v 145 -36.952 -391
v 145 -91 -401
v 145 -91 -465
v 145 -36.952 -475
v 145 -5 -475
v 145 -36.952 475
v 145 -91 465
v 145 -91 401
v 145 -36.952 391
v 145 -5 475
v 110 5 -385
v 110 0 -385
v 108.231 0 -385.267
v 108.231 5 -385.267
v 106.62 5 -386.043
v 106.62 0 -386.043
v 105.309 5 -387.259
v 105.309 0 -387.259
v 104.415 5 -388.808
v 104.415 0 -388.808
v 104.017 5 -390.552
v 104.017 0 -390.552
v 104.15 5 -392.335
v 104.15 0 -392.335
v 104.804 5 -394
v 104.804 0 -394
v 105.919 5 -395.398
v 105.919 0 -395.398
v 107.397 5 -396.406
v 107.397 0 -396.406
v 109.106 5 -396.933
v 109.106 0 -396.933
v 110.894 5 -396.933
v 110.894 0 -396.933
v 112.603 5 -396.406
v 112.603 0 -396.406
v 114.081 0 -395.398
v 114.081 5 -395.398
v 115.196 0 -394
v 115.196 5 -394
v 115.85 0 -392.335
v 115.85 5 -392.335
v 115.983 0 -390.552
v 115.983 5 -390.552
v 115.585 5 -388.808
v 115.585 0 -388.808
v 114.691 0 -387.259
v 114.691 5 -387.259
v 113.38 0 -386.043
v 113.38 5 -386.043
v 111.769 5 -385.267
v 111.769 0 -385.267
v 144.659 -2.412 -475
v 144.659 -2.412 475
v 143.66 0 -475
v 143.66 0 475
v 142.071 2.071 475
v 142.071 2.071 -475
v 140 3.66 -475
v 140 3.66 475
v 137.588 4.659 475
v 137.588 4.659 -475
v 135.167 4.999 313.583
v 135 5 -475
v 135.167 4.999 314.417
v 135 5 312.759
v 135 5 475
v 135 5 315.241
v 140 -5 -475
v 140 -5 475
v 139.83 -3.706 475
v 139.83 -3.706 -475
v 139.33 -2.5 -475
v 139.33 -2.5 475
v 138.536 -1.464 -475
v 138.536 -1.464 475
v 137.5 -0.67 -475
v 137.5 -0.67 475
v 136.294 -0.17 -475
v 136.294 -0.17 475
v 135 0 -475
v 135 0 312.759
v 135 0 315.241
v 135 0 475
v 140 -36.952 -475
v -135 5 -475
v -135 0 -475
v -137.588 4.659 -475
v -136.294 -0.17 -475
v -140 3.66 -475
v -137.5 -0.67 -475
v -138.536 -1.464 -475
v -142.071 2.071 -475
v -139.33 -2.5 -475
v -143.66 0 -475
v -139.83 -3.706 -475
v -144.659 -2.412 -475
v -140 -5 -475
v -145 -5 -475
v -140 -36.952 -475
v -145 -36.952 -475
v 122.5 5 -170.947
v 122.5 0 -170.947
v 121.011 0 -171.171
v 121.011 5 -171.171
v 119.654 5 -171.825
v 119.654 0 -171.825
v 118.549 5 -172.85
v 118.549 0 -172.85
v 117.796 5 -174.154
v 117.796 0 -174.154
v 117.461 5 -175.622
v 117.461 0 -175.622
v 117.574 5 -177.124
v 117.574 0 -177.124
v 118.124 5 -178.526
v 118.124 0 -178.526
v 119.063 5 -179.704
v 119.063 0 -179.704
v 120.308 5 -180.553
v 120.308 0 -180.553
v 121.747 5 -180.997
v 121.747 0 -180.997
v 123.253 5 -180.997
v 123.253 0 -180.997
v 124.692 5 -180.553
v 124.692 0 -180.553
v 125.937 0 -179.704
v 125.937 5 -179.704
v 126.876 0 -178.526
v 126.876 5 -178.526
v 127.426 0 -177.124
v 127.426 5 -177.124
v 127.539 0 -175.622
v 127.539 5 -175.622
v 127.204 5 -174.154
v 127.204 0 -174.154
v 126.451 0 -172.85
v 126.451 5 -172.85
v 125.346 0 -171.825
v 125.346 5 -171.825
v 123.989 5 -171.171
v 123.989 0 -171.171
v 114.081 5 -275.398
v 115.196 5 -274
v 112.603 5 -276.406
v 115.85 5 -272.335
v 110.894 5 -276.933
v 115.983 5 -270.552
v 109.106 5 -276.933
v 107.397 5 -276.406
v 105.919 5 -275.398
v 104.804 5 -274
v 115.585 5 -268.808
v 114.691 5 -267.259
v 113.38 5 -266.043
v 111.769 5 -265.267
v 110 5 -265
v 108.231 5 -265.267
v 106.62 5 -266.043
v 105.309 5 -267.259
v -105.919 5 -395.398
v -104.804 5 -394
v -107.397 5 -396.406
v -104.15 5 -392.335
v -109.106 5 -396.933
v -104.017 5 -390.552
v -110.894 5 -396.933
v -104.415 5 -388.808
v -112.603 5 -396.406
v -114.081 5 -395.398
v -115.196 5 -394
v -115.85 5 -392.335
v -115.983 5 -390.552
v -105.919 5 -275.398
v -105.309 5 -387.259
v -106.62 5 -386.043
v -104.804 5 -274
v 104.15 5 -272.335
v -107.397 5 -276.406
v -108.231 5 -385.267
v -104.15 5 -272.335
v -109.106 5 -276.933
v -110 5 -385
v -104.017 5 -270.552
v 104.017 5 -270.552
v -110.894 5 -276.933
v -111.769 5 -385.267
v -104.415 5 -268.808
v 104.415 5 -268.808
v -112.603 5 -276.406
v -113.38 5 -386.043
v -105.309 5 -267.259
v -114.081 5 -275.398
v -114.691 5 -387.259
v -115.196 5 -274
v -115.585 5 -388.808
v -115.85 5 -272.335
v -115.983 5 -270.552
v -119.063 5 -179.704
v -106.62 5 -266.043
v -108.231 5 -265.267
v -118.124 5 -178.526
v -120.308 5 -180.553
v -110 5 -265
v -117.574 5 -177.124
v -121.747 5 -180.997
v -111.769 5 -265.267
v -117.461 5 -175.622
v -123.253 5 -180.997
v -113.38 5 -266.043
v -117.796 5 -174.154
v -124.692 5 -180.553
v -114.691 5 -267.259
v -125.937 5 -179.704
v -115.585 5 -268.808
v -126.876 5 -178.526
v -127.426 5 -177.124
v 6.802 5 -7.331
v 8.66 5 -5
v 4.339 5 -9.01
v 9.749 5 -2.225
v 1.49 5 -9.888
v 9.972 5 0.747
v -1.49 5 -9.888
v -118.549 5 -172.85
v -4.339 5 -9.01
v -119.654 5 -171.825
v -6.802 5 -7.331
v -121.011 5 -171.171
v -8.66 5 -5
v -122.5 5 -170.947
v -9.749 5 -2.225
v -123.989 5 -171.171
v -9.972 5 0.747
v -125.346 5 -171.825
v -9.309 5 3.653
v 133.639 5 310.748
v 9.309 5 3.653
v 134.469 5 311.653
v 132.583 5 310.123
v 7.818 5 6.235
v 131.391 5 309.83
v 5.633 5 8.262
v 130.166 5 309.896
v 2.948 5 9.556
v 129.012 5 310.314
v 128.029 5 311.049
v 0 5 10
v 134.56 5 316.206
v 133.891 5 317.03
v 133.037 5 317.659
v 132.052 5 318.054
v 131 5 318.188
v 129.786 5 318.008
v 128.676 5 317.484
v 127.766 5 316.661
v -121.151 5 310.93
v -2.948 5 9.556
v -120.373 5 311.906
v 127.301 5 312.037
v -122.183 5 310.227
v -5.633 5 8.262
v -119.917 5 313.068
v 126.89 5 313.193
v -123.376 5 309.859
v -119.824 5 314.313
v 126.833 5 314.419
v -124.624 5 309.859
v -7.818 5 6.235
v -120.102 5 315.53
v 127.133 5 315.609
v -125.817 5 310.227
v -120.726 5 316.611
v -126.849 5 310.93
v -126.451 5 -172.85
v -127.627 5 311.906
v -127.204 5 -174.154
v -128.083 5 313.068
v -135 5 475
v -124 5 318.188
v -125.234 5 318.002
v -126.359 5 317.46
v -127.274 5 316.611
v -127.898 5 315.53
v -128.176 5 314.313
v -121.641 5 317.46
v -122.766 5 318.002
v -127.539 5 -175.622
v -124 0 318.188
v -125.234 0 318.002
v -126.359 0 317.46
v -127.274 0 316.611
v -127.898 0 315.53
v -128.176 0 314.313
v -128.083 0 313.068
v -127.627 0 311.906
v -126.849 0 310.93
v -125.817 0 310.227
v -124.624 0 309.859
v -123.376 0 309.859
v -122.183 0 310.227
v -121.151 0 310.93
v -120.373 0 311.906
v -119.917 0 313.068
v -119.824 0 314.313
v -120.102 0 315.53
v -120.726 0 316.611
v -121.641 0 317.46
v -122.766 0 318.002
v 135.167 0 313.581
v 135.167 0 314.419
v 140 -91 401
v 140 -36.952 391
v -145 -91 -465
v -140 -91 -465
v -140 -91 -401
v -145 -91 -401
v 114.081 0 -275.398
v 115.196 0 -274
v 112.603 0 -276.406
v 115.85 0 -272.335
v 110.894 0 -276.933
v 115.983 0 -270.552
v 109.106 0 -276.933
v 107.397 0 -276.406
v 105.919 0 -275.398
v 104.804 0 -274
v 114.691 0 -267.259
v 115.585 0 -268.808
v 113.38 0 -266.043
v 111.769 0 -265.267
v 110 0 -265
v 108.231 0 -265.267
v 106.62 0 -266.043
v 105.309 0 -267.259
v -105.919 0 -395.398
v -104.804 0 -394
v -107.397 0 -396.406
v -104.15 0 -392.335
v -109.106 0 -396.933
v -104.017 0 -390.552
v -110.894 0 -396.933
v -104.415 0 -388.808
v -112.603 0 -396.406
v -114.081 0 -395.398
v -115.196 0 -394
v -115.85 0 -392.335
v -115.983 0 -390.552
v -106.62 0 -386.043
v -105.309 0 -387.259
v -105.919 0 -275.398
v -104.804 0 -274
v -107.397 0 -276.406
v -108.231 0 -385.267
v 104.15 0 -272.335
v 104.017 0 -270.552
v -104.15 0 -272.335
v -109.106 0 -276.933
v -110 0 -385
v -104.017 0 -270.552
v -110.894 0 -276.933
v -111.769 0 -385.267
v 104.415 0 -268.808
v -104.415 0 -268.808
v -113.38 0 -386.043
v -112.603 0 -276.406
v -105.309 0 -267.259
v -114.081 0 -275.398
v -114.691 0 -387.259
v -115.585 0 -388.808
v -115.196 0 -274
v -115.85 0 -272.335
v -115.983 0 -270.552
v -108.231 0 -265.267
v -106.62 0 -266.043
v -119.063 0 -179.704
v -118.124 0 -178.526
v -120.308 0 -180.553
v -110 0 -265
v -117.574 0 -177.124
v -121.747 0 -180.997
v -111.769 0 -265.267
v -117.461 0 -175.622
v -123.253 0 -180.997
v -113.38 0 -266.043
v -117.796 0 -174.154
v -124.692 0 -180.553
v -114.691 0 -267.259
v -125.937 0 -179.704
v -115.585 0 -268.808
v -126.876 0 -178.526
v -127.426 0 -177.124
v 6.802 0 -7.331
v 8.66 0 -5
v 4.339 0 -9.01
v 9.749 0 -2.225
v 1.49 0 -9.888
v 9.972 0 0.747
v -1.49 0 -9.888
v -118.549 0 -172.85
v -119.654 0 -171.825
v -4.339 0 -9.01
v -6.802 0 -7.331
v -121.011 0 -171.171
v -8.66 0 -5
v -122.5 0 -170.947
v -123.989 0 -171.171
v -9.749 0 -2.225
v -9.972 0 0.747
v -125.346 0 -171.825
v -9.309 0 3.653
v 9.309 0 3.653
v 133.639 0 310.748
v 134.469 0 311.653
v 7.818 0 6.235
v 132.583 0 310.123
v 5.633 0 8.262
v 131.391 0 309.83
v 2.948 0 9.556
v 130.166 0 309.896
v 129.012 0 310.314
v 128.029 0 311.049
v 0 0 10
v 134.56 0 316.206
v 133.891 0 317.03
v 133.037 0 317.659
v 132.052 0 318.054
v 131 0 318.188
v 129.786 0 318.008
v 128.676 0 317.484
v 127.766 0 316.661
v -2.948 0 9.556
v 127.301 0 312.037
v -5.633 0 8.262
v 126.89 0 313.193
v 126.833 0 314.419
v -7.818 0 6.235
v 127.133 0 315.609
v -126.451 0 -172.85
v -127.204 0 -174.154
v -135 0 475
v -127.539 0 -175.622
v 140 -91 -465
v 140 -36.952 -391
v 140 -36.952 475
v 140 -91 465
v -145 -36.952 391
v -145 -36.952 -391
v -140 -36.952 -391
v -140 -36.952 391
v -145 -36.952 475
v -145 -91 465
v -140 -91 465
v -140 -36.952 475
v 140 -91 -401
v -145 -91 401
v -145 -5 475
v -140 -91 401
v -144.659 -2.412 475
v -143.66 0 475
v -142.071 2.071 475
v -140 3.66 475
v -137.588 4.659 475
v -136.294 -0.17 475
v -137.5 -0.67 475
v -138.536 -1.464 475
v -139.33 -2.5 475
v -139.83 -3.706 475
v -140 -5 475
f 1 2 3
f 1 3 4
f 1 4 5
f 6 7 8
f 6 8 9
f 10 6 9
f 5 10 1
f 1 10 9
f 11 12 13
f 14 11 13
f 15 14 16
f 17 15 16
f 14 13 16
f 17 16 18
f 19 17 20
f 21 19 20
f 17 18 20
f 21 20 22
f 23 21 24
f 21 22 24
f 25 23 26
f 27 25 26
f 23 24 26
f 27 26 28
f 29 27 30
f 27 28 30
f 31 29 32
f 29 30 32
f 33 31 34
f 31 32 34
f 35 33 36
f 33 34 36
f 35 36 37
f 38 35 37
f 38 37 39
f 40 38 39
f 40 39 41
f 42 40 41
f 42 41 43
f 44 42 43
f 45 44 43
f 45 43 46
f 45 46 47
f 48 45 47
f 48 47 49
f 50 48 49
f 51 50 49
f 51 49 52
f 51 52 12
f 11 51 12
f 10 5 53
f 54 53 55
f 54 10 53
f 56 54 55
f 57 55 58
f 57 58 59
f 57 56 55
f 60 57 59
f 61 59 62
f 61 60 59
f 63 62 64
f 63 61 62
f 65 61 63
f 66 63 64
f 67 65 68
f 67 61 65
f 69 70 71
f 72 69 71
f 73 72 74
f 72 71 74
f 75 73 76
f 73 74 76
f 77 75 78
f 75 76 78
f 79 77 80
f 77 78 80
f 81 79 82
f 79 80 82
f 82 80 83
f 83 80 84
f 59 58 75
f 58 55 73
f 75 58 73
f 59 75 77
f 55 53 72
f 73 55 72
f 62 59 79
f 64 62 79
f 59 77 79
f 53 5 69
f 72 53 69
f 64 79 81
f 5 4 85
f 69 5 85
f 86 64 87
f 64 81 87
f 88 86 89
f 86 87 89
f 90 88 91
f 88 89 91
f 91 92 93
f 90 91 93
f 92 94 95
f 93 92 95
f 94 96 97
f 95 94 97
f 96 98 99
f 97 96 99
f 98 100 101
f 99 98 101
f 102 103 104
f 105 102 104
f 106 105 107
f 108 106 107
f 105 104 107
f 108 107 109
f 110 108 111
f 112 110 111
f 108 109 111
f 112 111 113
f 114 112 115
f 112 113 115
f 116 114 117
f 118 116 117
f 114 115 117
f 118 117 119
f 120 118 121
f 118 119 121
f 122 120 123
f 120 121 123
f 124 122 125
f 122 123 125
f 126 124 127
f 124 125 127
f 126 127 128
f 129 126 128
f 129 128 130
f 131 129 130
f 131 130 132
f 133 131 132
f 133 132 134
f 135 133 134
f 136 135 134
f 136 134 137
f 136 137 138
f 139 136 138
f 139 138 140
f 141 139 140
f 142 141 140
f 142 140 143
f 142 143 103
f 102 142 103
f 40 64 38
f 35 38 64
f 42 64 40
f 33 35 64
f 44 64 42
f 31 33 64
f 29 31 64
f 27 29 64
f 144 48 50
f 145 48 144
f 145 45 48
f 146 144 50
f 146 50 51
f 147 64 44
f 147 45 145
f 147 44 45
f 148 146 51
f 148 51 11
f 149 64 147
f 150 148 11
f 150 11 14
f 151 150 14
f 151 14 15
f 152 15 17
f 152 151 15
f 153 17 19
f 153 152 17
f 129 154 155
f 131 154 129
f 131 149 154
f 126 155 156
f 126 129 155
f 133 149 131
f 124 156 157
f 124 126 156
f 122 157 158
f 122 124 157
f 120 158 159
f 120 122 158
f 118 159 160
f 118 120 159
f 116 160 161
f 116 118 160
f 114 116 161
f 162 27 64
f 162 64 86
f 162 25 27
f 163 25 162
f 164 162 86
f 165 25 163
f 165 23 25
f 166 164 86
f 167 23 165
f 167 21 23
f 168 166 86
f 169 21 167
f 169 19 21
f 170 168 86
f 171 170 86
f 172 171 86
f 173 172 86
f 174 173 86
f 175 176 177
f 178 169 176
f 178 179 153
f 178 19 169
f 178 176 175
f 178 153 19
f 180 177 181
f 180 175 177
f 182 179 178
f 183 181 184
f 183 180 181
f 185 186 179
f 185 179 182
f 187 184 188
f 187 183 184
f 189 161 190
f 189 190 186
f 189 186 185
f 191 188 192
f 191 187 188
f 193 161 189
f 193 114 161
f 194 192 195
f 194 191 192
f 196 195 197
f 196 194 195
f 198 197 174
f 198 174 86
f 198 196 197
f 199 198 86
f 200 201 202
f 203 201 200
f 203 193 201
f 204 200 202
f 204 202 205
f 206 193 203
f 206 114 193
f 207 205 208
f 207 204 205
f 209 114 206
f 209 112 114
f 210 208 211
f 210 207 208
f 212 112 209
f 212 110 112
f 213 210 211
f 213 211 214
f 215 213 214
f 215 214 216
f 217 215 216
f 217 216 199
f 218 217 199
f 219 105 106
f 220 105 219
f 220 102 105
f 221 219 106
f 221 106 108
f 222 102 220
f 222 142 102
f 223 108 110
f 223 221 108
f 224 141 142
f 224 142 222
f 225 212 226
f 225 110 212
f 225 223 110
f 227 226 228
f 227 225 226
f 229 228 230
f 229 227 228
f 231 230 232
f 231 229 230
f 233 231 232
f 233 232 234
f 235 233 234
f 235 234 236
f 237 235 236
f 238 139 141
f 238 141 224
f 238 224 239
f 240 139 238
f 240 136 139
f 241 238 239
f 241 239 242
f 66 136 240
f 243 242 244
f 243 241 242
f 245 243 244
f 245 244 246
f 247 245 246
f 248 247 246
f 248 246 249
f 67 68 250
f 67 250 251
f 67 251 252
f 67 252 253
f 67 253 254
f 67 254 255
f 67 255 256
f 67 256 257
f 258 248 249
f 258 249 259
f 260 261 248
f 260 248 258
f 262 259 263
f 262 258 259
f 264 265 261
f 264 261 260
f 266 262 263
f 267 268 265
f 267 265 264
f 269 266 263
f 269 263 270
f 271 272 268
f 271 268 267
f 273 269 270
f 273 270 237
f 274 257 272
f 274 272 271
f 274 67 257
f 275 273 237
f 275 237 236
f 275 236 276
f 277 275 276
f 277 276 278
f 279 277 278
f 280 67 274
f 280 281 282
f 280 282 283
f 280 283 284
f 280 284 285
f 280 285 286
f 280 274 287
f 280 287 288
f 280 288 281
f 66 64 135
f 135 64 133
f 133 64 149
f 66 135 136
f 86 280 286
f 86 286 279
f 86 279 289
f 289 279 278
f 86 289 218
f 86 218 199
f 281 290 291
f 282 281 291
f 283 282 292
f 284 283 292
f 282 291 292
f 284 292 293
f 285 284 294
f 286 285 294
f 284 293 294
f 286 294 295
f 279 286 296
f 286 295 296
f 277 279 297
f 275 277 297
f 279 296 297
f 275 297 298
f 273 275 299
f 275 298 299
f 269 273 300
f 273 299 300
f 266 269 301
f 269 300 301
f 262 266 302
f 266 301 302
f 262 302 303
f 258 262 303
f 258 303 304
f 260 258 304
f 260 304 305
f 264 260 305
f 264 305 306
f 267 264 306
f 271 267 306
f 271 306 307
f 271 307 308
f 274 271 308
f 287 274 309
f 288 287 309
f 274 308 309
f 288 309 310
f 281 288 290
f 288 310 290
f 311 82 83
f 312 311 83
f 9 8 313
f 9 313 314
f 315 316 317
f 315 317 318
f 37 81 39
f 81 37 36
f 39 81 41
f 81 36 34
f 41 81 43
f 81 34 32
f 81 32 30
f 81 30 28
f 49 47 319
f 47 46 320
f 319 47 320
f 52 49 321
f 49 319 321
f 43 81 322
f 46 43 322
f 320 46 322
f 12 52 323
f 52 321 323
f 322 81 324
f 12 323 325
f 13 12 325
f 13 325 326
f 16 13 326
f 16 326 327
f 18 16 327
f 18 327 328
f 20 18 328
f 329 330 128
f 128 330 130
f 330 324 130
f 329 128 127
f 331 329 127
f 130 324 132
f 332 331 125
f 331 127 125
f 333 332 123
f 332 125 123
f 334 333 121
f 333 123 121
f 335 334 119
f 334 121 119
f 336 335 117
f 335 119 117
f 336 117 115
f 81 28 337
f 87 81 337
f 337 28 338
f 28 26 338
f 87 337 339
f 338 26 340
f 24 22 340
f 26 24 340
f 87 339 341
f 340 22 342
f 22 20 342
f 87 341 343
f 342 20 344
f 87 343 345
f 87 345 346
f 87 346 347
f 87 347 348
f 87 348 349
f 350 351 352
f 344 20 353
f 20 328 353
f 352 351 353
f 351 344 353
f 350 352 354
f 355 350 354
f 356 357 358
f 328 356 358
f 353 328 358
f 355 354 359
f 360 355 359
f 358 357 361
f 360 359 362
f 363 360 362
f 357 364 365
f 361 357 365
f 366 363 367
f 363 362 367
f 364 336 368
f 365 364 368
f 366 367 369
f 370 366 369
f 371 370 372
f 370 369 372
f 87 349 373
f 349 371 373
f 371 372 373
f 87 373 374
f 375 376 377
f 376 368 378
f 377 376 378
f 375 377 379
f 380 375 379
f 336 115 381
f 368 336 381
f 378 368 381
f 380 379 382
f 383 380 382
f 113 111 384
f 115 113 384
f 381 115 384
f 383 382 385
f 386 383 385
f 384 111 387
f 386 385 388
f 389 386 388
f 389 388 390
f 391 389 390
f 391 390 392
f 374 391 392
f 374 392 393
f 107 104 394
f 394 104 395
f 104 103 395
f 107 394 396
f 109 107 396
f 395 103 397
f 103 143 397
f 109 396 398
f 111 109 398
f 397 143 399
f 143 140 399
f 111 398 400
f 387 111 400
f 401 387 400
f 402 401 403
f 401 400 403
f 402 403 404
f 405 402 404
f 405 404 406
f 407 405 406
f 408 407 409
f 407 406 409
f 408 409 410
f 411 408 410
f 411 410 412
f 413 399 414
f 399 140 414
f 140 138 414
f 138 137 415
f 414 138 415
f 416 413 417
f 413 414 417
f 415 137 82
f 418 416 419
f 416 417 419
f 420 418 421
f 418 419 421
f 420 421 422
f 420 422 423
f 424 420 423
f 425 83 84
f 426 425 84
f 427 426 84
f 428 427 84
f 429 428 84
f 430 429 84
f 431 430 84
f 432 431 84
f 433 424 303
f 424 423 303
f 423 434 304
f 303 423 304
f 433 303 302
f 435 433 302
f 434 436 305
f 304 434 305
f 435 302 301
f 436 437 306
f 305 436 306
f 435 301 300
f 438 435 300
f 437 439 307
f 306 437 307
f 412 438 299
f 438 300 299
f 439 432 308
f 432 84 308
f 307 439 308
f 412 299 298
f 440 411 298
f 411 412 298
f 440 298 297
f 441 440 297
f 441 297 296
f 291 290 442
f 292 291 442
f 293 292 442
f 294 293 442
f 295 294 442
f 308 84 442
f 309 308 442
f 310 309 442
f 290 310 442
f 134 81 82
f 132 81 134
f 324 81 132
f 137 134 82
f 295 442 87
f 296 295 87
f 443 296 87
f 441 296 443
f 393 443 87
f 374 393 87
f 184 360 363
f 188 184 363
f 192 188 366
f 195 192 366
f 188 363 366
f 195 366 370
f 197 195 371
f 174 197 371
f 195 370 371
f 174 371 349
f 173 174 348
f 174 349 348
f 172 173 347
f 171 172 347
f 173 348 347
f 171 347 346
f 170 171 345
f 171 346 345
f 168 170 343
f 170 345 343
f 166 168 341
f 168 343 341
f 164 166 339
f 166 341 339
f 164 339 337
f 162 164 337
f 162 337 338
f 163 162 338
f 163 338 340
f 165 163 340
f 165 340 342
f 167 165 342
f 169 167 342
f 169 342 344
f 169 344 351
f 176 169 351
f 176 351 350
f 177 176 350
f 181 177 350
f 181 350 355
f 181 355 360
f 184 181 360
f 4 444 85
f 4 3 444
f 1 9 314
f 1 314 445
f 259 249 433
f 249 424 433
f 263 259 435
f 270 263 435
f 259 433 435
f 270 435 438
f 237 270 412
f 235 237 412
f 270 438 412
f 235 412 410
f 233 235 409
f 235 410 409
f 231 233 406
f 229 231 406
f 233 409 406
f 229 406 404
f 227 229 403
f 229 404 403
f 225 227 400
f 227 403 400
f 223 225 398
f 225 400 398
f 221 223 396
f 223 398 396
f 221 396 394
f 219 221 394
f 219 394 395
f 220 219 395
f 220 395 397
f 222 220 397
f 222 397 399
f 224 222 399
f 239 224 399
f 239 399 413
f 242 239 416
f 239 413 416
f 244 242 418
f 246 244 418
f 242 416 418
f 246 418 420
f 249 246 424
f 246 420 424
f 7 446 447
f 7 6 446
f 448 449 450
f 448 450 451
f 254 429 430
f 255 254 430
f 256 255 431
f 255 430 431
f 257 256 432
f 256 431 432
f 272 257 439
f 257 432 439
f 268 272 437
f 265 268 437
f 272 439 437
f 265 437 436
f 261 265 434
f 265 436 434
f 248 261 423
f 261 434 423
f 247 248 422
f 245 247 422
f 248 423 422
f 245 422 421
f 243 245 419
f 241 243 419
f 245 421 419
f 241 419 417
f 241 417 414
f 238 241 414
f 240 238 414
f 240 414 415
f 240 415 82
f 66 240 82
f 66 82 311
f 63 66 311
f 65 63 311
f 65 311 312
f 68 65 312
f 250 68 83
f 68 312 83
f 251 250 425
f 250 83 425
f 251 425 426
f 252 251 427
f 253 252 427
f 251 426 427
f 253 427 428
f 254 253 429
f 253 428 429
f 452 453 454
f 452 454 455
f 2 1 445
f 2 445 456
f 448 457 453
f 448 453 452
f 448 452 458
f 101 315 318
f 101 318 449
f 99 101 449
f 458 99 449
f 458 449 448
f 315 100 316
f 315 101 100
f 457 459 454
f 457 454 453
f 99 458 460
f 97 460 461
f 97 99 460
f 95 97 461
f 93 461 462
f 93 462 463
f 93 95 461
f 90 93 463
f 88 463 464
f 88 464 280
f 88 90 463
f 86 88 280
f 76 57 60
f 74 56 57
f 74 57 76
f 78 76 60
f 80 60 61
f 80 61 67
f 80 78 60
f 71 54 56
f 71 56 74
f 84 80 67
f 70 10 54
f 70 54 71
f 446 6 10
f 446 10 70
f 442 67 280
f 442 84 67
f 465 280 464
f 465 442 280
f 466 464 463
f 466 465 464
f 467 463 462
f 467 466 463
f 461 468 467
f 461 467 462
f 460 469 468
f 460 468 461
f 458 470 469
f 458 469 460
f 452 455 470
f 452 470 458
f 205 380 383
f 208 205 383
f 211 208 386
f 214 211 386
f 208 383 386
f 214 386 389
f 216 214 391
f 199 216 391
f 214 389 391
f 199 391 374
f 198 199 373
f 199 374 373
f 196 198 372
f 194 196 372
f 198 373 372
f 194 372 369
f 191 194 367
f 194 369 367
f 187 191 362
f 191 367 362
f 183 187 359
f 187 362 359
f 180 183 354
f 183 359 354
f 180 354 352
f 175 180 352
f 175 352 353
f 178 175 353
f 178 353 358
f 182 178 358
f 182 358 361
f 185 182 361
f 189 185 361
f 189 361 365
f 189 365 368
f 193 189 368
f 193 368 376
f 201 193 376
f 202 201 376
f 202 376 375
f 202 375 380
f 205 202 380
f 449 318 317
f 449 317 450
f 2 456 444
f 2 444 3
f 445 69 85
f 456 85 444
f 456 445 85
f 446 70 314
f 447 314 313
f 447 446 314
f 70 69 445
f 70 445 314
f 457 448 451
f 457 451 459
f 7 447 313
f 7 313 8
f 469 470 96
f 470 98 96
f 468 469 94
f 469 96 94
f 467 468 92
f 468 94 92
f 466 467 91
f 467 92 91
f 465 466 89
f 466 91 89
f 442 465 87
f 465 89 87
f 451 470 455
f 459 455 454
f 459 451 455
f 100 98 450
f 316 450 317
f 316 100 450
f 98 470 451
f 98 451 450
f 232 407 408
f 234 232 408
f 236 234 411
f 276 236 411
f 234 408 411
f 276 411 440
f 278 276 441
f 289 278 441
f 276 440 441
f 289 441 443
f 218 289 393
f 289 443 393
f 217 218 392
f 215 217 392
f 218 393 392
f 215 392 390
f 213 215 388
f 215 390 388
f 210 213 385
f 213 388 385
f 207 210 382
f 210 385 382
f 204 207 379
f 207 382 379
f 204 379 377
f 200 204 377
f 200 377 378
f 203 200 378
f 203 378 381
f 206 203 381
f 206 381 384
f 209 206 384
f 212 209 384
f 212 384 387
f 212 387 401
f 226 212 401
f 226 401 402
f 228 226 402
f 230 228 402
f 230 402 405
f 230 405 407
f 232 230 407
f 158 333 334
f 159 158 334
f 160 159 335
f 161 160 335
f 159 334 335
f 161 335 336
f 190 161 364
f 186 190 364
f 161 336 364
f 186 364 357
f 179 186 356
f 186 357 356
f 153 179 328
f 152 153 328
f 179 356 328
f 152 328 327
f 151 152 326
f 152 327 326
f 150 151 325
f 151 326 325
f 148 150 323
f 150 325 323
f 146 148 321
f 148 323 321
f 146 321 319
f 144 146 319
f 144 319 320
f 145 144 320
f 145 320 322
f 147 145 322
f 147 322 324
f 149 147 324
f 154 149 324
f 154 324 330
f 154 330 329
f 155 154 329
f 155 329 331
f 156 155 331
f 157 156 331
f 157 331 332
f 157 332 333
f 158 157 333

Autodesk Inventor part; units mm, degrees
ref_plane "XZ Plane" through (0, 0, 0) normal (0, 1, 0) x (-1, 0, 0)
ref_plane "XY Plane" through (0, 0, 0) normal (0, 0, 1) x (1, 0, 0)
sketch "Skizze1" plane through (0, 0, 0) normal (0, 1, 0) x (-1, 0, 0)
  line L0 (-140, 475) -> (140, 475)
  line L1 (140, 475) -> (140, -475)
  line L2 (140, -475) -> (-140, -475)
  line L3 (-140, -475) -> (-140, 475)
  line L4 (-140, 475) -> (140, -475) construction
  line L5 (140, 475) -> (-140, -475) construction
  point P0 (0, 0)
  dimension "d0" = 950
  dimension "d1" = 280
extrude "Grobblech4" add sketch "Skizze1" along normal blind 5
sketch "Skizze2" plane through (140, 0, 475) normal (1, 0, 0) x (0, 1, 0)
  line L0 (0, -950) -> (0, 0)
  line L1 (0, 0) -> (-91, 0)
  line L2 (-91, 0) -> (-91, -950)
  line L3 (-91, -950) -> (0, -950)
edge flange "Lasche1" height 96 angle 90 thickness 5 bend radius 5 thickness toward (1, 0, 0) relief tear relief width 5 relief depth 2.5 corner gap 5 corner form 0 edges at (140, 0, 0) (-140, 0, 0) wall of the first edge with corners at (140, 0, -475) (140, 0, 475) (140, -91, 475) (140, -91, -475)
bend "Biegung1"
corner "Ecke1"
sketch "Skizze3" plane through (145, -92.952, 475) normal (1, 0, 0) x (0, 0, -1)
  line L0 (0, 56) -> (10, 1.952)
  line L1 (74, 1.952) -> (84, 56)
  line L2 (84, 56) -> (866, 56)
  line L3 (866, 56) -> (876, 1.952)
  line L4 (876, 1.952) -> (940, 1.952)
  line L5 (940, 1.952) -> (950, 56)
  line L6 (10, 1.952) -> (74, 1.952)
  line L7 (950, 87.952) -> (0, 87.952) projected
  line L8 (0, 1.952) -> (0, 87.952) projected
  line L9 (950, 1.952) -> (0, 1.952) projected
  line L10 (950, 87.952) -> (950, 1.952) projected
  line L11 (950, 1.952) -> (0, 1.952) projected
  point P0 (475, 92.952)
  point P1 (42, 1.952)
  point P2 (908, 1.952)
  point P3 (950, 56)
  point P4 (940, 1.952)
  point P5 (74, 1.952)
  point P6 (876, 1.952)
  point P7 (10, 1.952)
  point P8 (0, 56)
  dimension "d15" = 10
  dimension "d16" = 64
  dimension "d17" = 10
  dimension "d18" = 10
  dimension "d19" = 64
  dimension "d22" = 54.048
extrude "Extrusion2" cut sketch "Skizze3" against normal up to surface (5 mm away) contours L0 L9 L8 | L1 L2 L3 L9 | L10 L9 L5
ref_plane "Arbeitsebene1" through (0, 0, 0) normal (1, 0, 0) x (0, 1, 0)
mirror "Spiegeln1" about plane through (0, 0, 0) normal (1, 0, 0) of "Extrusion2"
sketch "Skizze4" plane through (0, 5, 0) normal (0, 1, 0) x (1, 0, 0)
  line L0 (-135, 475) -> (135, 475) projected
  point P0 (110, 391)
  point P1 (-110, 391)
  point P2 (0, 0)
  dimension "d34" = 220
  dimension "d76" = 84
  dimension "d77" = 110
hole "Bohrung1" at (110, 5, -391) at (-110, 5, -391) direction (0, -1, 0) diameter 12 depth 5
sketch "Skizze5" plane through (0, 5, 0) normal (0, 1, 0) x (1, 0, 0)
  circle A0 centre (-110, 391) radius 6 projected
  point P0 (110, 271)
  point P1 (-110, 271)
  point P2 (110, 391)
  point P3 (0, 0)
  dimension "d43" = 120
hole "Bohrung2" at (110, 5, -271) at (-110, 5, -271) direction (0, -1, 0) diameter 12 end through all
sketch "Skizze6" plane through (0, 5, 0) normal (0, 1, 0) x (1, 0, 0)
  circle A0 centre (110, 271) radius 6 projected
  point P0 (122.5, 176)
  point P1 (-122.5, 176)
  point P2 (0, 0)
  dimension "d55" = 245
  dimension "d88" = 122.5
  dimension "d89" = 95
hole "Bohrung3" at (122.5, 5, -176) at (-122.5, 5, -176) direction (0, -1, 0) diameter 10.106 end through all thread size "M12x1.75" class "6H" standard "ISO Metric profile"
sketch "Skizze7" plane through (0, 5, 0) normal (0, 1, 0) x (1, 0, 0)
  line L0 (145, 475) -> (145, -475) projected
  line L1 (0, 0) -> (0, -582.3396) construction
  point P0 (131, -314)
  point P1 (-124, -314)
  dimension "d73" = 255
  dimension "d79" = 14
  dimension "d80" = 314
hole "Bohrung5" at (131, 5, 314) at (-124, 5, 314) direction (0, -1, 0) diameter 8.376 depth 5 thread size "M10x1.5" class "6H" standard "ISO Metric profile"
sketch "Skizze8" plane through (0, 5, 0) normal (0, 1, 0) x (1, 0, 0)
  point P0 (0, 0)
  point P1 (0, 0)
hole "Bohrung6" at (0, 5, 0) direction (0, -1, 0) diameter 20 depth 5
equation "\"d31\" = Stärke"
equation "\"d88\" = 0.5 * d55"
equation "\"d64\" = d72"
equation "\"d82\" = d72"
equation "\"d2\" = Stärke"
equation "\"d3\" = BreiteBiegungsfreistellung"
equation "\"d4\" = TiefeBiegungsfreistellung"
equation "\"d5\" = MinimalRest"
equation "\"d6\" = Übergangsradius"
equation "\"d9\" = Biegeradius"
equation "\"d10\" = GrößeEckenfreistellung"
equation "\"d11\" = Abstandsgröße"
equation "\"d12\" = JacobiRadiusGröße"
equation "\"Biegeradius\" = Stärke"
equation "\"BreiteBiegungsfreistellung\" = Stärke"
equation "\"TiefeBiegungsfreistellung\" = 0.5 * Stärke"
equation "\"Übergangsradius\" = Biegeradius"
equation "\"JacobiRadiusGröße\" = Biegeradius"
equation "\"Abstandsgröße\" = Stärke"
equation "\"Stärke\" = 5"
equation "\"d72\" = 107"
equation "\"MinimalRest\" = 10"
equation "\"GrößeEckenfreistellung\" = 20"
properties part number "9" material "Aluminium 6061"
